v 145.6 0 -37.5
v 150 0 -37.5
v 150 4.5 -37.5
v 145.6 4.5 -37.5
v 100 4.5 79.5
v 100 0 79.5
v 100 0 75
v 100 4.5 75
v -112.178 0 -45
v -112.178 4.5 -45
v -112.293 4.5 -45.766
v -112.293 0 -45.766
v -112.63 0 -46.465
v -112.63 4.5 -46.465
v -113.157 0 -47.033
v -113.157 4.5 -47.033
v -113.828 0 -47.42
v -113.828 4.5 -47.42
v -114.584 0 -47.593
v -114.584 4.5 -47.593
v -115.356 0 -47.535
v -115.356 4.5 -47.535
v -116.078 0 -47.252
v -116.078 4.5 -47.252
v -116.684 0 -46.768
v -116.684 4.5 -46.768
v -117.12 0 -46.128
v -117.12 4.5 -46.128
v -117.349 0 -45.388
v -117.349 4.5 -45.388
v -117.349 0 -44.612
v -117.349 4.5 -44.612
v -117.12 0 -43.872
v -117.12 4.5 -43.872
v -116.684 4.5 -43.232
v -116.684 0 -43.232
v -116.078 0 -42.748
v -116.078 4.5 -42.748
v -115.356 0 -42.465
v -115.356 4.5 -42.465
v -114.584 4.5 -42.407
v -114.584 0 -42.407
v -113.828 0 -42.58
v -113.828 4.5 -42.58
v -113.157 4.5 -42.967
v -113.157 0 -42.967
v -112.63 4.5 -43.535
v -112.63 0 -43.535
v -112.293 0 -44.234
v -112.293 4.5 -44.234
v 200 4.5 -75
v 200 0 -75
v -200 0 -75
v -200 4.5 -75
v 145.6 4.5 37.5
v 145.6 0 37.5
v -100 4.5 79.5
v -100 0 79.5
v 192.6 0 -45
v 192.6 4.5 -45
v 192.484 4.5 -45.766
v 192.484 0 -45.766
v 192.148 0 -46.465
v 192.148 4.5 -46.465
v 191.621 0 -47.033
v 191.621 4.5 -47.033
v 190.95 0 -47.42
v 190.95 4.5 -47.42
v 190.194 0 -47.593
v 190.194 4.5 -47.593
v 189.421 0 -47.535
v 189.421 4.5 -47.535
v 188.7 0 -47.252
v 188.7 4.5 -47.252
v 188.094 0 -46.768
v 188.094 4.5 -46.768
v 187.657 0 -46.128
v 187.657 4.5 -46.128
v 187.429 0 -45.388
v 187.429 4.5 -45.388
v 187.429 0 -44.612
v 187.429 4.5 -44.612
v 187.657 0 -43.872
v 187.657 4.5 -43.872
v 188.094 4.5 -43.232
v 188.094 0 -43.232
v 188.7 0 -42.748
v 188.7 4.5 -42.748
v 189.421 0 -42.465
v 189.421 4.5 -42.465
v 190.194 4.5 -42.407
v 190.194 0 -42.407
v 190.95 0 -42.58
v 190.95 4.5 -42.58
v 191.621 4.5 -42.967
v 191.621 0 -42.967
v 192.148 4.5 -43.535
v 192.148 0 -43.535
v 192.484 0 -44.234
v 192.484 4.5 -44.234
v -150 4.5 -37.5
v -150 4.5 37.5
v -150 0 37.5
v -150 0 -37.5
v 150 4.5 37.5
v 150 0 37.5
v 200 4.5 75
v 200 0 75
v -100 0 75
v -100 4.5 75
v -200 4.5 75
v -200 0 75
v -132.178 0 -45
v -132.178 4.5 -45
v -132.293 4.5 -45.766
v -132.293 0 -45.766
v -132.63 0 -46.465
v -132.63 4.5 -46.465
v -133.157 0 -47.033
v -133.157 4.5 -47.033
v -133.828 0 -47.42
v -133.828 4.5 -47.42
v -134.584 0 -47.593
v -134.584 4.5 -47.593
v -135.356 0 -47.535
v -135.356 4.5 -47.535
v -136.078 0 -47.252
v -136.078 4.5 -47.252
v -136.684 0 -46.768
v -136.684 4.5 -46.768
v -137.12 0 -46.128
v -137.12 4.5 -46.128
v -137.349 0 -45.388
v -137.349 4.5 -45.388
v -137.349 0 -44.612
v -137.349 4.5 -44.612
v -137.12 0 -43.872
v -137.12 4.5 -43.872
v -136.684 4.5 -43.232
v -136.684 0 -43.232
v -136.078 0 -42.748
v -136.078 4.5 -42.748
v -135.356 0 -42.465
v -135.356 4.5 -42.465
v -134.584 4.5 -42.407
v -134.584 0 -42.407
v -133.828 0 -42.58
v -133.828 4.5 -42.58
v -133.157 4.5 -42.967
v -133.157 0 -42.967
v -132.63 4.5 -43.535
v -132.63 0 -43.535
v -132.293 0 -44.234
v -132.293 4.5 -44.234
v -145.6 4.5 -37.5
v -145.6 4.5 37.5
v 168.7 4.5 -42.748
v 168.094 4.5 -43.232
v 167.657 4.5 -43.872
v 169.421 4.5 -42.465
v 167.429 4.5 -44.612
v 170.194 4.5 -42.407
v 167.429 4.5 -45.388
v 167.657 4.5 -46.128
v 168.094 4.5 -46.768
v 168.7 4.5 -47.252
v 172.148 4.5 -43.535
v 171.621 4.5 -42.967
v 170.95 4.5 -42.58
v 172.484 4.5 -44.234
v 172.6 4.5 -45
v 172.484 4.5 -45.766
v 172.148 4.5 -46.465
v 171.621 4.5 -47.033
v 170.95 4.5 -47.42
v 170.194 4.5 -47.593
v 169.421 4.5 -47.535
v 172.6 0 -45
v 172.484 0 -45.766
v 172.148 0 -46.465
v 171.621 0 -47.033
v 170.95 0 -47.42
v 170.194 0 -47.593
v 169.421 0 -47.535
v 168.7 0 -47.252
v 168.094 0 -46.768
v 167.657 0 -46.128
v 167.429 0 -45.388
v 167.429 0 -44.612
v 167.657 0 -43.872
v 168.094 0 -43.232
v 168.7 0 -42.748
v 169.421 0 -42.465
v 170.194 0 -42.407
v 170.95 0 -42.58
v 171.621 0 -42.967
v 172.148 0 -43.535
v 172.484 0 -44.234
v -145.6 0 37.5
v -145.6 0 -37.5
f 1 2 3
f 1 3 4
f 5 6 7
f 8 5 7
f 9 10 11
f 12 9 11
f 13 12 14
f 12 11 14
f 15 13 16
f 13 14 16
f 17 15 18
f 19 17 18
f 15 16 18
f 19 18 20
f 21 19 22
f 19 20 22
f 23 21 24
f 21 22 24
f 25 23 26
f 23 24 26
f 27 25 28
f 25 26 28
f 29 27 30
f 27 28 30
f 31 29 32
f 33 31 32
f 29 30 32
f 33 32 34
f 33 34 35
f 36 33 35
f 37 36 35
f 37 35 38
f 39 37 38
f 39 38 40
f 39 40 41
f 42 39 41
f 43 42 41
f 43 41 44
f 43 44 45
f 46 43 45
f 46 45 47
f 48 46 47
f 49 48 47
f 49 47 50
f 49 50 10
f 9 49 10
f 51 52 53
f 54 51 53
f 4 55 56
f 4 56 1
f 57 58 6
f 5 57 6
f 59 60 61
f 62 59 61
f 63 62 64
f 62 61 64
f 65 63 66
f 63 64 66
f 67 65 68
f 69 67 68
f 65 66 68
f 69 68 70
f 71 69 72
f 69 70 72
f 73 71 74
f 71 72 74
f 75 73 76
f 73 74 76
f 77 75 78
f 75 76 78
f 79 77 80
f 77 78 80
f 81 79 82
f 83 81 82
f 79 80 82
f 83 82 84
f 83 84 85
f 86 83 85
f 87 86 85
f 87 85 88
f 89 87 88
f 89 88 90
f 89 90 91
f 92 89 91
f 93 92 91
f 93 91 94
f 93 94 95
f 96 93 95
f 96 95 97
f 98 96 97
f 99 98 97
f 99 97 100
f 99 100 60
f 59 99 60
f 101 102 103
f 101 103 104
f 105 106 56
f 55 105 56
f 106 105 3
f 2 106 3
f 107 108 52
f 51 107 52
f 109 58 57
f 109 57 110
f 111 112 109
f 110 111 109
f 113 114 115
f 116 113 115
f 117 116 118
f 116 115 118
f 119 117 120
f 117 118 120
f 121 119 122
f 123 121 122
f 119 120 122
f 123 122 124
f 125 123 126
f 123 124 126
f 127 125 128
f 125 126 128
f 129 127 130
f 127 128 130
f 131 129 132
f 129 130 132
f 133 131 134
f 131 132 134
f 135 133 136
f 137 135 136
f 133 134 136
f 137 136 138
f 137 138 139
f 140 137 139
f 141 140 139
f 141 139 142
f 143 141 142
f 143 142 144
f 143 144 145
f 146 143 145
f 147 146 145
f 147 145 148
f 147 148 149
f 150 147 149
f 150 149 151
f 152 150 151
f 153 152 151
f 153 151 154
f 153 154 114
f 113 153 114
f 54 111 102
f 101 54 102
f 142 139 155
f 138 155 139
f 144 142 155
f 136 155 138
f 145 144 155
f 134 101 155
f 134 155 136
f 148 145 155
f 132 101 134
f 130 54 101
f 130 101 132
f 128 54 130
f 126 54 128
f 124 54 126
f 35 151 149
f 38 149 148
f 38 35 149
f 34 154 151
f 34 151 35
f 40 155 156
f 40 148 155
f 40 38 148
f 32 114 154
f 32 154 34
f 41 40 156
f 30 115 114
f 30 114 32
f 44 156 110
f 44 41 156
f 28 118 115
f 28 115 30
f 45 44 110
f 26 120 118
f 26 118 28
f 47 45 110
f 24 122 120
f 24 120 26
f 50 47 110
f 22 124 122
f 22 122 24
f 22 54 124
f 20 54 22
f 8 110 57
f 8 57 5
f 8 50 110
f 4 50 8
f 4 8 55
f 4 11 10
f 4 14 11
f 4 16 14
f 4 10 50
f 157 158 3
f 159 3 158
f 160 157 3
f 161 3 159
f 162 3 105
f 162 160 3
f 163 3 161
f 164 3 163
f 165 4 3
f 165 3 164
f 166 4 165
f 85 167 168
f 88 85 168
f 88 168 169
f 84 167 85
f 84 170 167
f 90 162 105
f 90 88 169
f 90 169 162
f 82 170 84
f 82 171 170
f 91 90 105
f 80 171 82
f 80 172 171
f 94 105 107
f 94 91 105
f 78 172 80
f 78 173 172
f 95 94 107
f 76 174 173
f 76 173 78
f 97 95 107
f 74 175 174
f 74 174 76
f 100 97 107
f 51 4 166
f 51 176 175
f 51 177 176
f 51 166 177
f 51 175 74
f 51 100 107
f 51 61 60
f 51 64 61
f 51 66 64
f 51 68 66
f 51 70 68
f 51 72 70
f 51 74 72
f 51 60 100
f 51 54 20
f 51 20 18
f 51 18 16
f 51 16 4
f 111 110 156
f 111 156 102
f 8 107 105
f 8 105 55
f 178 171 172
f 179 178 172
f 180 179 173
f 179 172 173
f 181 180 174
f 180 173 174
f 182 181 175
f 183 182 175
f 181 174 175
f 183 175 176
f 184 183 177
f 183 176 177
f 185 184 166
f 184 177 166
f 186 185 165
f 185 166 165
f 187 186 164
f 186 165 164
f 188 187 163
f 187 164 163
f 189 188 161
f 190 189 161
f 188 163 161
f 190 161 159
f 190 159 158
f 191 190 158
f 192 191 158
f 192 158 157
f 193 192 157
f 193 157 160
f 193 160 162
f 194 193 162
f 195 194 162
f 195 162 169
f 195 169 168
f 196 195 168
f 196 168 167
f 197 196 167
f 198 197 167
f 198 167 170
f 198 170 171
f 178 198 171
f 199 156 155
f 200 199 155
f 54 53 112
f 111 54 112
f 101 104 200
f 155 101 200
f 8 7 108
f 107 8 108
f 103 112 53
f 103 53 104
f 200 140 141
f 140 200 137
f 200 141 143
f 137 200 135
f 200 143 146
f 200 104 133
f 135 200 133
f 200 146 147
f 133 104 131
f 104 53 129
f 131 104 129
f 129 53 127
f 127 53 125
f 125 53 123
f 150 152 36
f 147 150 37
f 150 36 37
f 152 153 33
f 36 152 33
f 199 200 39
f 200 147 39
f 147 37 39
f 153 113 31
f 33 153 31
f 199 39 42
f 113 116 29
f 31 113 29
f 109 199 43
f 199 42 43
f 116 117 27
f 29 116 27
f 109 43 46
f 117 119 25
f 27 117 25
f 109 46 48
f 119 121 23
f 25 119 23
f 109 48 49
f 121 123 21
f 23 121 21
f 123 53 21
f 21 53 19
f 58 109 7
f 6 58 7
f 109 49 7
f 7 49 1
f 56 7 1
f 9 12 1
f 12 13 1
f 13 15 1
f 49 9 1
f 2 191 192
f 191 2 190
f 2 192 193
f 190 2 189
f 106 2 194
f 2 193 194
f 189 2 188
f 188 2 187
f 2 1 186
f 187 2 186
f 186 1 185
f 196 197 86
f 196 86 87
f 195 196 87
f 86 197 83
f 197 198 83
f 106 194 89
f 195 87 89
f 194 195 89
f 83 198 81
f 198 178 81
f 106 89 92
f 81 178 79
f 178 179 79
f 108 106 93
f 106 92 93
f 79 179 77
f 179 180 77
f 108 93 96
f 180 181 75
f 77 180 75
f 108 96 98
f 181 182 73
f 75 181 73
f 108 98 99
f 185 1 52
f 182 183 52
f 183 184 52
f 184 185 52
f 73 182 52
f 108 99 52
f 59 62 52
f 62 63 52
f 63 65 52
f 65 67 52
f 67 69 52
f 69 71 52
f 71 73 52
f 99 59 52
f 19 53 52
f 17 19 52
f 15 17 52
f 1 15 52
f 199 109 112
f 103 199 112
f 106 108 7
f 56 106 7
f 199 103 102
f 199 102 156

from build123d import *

# Parameters (mm, degrees)
SKETCH1_W           = 200
SKETCH1_H           = 4.5
BOSS_EXTRUDE1_DEPTH = 4.5
SKETCH3_W           = 4.4
SKETCH3_H           = 75
CUT_EXTRUDE1_DEPTH  = 4.5
CUT_EXTRUDE2_REACH  = 6.5
SKETCH5_R           = 2.6


with BuildPart() as part:
    # Sketch1 → Boss-Extrude1 (new body)
    with BuildSketch(Plane(origin=(0, 0, 0), x_dir=(1, 0, 0), z_dir=(0, 1, 0))):
        Polygon((200, 75), (-200, 75), (-200, -75), (-100, -75), (-100, -70.5), (100, -70.5), (100, -75), (200, -75), align=None)
        with Locations((0, -77.25)):
            Rectangle(SKETCH1_W, SKETCH1_H)
        with Locations((0, -72.75)):
            Rectangle(SKETCH1_W, SKETCH1_H)
    extrude(amount=BOSS_EXTRUDE1_DEPTH)

    # Sketch3 → Cut-Extrude1 (cut)
    with BuildSketch(Plane(origin=(0, 4.5, 0), x_dir=(1, 0, 0), z_dir=(0, 1, 0))):
        with Locations((-147.8, 0)):
            Rectangle(SKETCH3_W, SKETCH3_H)
    cut_extrude1 = extrude(amount=-CUT_EXTRUDE1_DEPTH, mode=Mode.SUBTRACT)

    # Mirror1: Cut-Extrude1 across plane
    add(cut_extrude1.mirror(Plane(origin=(0, 0, 0), x_dir=(0, 0, 1), z_dir=(1, 0, 0))), mode=Mode.SUBTRACT)

    # Sketch5 → Cut-Extrude2 (cut, up to next)
    with BuildSketch(Plane(origin=(0, 4.5, 0), x_dir=(1, 0, 0), z_dir=(0, 1, 0)), mode=Mode.PRIVATE) as cut_extrude2_sk1:
        with Locations((-114.777861762, 45)):
            Circle(SKETCH5_R)
    cut_extrude2_tool1 = extrude(cut_extrude2_sk1.sketch, amount=-CUT_EXTRUDE2_REACH, mode=Mode.PRIVATE) & part.part
    add(cut_extrude2_tool1.solids().sort_by_distance((-114.777862, 4.5, -45))[0], mode=Mode.SUBTRACT)
    # Sketch5 → Cut-Extrude2 (cut, up to next)
    with BuildSketch(Plane(origin=(0, 4.5, 0), x_dir=(1, 0, 0), z_dir=(0, 1, 0)), mode=Mode.PRIVATE) as cut_extrude2_sk2:
        with Locations((170, 45)):
            Circle(SKETCH5_R)
    cut_extrude2_tool2 = extrude(cut_extrude2_sk2.sketch, amount=-CUT_EXTRUDE2_REACH, mode=Mode.PRIVATE) & part.part
    add(cut_extrude2_tool2.solids().sort_by_distance((170, 4.5, -45))[0], mode=Mode.SUBTRACT)
    # Sketch5 → Cut-Extrude2 (cut, up to next)
    with BuildSketch(Plane(origin=(0, 4.5, 0), x_dir=(1, 0, 0), z_dir=(0, 1, 0)), mode=Mode.PRIVATE) as cut_extrude2_sk3:
        with Locations((-134.777861762, 45)):
            Circle(SKETCH5_R)
    cut_extrude2_tool3 = extrude(cut_extrude2_sk3.sketch, amount=-CUT_EXTRUDE2_REACH, mode=Mode.PRIVATE) & part.part
    add(cut_extrude2_tool3.solids().sort_by_distance((-134.777862, 4.5, -45))[0], mode=Mode.SUBTRACT)
    # Sketch5 → Cut-Extrude2 (cut, up to next)
    with BuildSketch(Plane(origin=(0, 4.5, 0), x_dir=(1, 0, 0), z_dir=(0, 1, 0)), mode=Mode.PRIVATE) as cut_extrude2_sk4:
        with Locations((190, 45)):
            Circle(SKETCH5_R)
    cut_extrude2_tool4 = extrude(cut_extrude2_sk4.sketch, amount=-CUT_EXTRUDE2_REACH, mode=Mode.PRIVATE) & part.part
    add(cut_extrude2_tool4.solids().sort_by_distance((190, 4.5, -45))[0], mode=Mode.SUBTRACT)


solid = part.part
